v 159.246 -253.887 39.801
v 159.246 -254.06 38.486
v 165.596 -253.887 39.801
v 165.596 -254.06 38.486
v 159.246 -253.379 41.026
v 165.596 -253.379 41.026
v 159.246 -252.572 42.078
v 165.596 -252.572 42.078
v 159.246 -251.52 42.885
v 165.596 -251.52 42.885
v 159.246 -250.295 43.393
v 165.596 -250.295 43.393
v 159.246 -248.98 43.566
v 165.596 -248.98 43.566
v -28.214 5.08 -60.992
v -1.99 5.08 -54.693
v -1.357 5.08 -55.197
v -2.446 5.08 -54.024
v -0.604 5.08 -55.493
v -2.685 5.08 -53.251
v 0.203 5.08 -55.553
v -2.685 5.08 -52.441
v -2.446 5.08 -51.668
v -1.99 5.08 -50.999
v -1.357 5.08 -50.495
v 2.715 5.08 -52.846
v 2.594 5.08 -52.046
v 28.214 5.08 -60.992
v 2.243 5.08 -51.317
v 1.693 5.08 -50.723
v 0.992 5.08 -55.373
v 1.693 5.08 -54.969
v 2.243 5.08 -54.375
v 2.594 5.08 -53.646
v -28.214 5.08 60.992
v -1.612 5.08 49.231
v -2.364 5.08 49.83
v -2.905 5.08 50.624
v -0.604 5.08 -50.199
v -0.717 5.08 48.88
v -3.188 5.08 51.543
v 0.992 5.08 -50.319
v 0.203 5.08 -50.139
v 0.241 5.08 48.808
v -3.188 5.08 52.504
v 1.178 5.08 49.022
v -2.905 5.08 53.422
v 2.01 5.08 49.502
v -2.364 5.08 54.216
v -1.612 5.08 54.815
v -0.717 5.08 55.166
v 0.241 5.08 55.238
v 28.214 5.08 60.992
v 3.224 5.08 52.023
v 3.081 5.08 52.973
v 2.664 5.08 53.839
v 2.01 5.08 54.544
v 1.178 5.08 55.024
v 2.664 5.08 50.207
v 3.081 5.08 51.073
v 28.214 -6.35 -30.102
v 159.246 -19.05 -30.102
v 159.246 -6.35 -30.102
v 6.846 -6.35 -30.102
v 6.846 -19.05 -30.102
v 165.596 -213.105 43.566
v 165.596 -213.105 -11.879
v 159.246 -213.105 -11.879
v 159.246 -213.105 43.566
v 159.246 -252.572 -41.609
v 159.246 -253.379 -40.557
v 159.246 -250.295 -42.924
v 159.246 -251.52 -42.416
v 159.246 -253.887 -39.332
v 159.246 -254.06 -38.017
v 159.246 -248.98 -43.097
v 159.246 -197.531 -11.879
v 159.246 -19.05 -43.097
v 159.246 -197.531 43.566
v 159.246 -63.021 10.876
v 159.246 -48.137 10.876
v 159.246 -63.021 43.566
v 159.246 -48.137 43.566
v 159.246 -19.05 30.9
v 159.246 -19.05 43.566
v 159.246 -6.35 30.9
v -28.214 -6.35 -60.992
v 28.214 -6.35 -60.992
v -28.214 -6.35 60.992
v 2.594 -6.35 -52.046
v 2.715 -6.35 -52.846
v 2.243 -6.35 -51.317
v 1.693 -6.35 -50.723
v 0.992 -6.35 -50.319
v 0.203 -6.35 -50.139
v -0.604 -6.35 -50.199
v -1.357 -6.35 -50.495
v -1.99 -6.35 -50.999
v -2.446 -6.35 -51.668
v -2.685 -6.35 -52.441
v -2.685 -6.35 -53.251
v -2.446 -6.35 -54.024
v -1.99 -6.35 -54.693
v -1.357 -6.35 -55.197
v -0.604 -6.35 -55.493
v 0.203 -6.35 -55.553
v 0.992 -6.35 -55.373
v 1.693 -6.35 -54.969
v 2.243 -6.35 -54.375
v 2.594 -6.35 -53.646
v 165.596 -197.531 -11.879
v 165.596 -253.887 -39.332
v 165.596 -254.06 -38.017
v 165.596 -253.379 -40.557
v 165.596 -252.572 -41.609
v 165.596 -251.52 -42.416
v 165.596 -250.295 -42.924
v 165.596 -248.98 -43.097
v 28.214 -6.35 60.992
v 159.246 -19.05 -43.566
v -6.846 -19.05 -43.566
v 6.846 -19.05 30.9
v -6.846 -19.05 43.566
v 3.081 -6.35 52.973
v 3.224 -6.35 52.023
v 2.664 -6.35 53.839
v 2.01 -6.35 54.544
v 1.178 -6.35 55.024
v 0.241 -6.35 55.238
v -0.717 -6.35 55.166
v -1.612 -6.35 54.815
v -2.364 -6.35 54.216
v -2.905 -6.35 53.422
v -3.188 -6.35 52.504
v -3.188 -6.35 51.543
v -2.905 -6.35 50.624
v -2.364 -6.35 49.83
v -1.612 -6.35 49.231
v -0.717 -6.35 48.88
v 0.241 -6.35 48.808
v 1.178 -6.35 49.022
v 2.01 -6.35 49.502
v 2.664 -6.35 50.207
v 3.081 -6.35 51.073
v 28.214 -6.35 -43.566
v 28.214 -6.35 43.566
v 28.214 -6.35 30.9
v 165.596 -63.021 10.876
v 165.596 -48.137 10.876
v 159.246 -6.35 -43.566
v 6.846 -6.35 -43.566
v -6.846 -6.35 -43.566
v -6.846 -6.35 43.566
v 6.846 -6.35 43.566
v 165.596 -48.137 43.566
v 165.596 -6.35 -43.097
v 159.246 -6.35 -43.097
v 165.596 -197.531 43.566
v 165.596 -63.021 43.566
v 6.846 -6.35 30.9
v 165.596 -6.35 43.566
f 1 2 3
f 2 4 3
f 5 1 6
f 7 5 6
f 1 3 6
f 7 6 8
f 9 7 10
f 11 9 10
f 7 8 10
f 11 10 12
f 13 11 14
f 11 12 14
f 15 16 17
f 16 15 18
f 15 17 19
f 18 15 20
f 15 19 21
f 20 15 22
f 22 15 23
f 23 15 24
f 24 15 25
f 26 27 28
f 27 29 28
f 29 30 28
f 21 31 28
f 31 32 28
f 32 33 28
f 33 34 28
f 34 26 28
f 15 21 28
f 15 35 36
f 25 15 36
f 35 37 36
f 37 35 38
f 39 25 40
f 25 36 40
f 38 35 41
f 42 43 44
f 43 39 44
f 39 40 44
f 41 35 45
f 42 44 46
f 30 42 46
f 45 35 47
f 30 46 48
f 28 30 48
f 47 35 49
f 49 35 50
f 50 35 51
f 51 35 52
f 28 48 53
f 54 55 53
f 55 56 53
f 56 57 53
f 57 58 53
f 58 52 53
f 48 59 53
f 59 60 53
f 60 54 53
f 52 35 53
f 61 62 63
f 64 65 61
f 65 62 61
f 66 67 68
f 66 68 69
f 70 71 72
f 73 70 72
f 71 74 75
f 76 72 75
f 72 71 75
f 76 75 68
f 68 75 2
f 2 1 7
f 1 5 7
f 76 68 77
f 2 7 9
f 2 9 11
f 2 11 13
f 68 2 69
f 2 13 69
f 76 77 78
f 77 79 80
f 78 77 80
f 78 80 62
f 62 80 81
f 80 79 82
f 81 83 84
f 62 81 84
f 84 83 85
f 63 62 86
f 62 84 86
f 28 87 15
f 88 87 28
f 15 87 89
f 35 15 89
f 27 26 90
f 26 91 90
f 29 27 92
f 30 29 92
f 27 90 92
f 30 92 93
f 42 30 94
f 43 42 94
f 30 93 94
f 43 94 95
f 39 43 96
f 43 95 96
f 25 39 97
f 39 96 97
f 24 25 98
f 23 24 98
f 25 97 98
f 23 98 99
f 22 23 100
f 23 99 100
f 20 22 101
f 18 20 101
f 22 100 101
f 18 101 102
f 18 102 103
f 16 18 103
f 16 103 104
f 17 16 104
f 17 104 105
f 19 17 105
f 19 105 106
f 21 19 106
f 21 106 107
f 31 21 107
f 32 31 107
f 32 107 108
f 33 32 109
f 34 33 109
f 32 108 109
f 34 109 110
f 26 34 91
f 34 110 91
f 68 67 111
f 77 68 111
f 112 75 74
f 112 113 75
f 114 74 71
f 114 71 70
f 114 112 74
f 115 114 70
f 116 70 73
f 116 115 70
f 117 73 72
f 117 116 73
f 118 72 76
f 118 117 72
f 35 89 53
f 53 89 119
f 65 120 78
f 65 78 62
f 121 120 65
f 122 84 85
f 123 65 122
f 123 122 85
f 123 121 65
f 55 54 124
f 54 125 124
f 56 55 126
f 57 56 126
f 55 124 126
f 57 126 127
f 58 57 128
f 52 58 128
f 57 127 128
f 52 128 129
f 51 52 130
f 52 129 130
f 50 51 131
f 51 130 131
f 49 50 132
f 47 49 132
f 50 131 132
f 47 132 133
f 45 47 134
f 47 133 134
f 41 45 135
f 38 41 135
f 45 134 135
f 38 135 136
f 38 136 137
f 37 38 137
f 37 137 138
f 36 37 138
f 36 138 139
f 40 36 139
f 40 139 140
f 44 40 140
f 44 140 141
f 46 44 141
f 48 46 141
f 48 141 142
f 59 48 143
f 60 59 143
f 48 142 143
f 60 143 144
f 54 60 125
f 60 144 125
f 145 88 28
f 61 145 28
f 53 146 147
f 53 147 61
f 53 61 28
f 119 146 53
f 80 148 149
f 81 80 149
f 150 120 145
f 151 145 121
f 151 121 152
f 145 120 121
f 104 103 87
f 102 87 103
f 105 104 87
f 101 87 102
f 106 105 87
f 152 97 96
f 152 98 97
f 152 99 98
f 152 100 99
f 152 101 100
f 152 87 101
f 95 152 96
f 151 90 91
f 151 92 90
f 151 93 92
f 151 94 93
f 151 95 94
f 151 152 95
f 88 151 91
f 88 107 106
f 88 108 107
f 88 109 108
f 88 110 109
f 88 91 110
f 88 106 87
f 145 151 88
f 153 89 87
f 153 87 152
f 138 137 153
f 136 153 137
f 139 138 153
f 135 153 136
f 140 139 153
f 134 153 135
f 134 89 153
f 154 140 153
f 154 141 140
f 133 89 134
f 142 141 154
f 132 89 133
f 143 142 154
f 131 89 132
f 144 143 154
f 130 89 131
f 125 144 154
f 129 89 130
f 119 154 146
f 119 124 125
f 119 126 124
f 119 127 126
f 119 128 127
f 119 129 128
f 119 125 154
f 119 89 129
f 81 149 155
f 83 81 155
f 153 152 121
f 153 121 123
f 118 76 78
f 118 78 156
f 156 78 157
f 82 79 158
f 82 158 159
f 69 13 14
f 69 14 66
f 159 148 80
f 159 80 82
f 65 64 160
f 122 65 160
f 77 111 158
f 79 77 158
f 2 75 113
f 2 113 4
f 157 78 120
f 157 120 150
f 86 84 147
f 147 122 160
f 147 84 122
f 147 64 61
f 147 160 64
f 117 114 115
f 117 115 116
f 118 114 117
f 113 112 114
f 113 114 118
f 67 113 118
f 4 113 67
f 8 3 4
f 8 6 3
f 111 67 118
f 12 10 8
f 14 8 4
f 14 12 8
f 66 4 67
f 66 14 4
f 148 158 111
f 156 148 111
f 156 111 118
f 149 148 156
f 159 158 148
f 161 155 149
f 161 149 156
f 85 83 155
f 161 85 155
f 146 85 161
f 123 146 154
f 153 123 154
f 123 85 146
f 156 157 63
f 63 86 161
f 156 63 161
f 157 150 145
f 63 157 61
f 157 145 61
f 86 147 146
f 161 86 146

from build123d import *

# Parameters (mm, degrees)
F0_W      = 56.428283453
F0_H      = 121.9848245382
F1_DEPTH  = 6.35
F2_W      = 13.6921107769
F2_H      = 87.1320217848
F3_DEPTH  = 12.7
F4_W      = 12.7
F4_H      = 12.6656033099
F5_DEPTH  = 152.4
F6_W      = 12.7
F6_H      = 13.4637728333
F7_DEPTH  = 152.4
F8_R      = 3.224201557
F8_R_2    = 2.7149600872
F9_DEPTH  = 6.351
F10_W     = 247.7097766638
F10_H     = 86.6629034281
F11_DEPTH = 6.35
F12_W     = 14.8840993643
F12_H     = 44.3546175957
F12_W_2   = 15.5743807554
F12_H_2   = 78.4596502781
F13_DEPTH = 25.4
F14_R     = 5.08
F15_DEPTH = 5.08


# Not quite as in the source:
# - the program builds the solid bodies; features that only make, move or delete a surface that nothing else refers to are left out


with BuildPart() as f1:
    # F0 (on Front) → F1 (new body)
    with BuildSketch(Plane.XZ):
        Rectangle(F0_W, F0_H)
    extrude(amount=F1_DEPTH)

    # F2 (on face) → F3 (join)
    with BuildSketch(Plane.XZ.offset(6.35)):
        Rectangle(F2_W, F2_H)
    extrude(amount=F3_DEPTH)

    # F4 (on face) → F5 (join)
    with BuildSketch(Plane.YZ.offset(6.8460553885)):
        with Locations((-12.7, 37.2332092375)):
            Rectangle(F4_W, F4_H)
    extrude(amount=F5_DEPTH)

    # F6 (on face) → F7 (join)
    with BuildSketch(Plane.YZ.offset(6.8460553885)):
        with Locations((-12.7, -36.8341244757)):
            Rectangle(F6_W, F6_H)
    extrude(amount=F7_DEPTH)

    # F8 (on face) → F9 (cut, through all)
    with BuildSketch(Plane.XZ.offset(6.35)):
        with Locations((0, 52.0230680704)):
            Circle(F8_R)
        with Locations((0, -52.8460629284)):
            Circle(F8_R_2)
    extrude(amount=-F9_DEPTH, mode=Mode.SUBTRACT)

    # F10 (on face) → F11 (join)
    with BuildSketch(Plane.YZ.offset(159.2460553885)):
        with Locations((-130.2048883319, 0.2345591784)):
            Rectangle(F10_W, F10_H)
    extrude(amount=F11_DEPTH)

    # F12 (on face) → F13 (cut)
    with BuildSketch(Plane.YZ.offset(165.5960553885)):
        with Locations((-55.5786713958, 33.0530032516)):
            Rectangle(F12_W, F12_H)
        with Locations((-205.3182795644, 27.350962162)):
            Rectangle(F12_W_2, F12_H_2)
    extrude(amount=-F13_DEPTH, mode=Mode.SUBTRACT)

    # F14
    f14_edges = [f1.edges().sort_by_distance(p)[0] for p in [
        (162.421055, -254.059777, 43.566011),
        (162.421055, -254.059777, -43.096893),
    ]]
    fillet(f14_edges, radius=F14_R)

    # F15 (add): a face of the model
    f15_faces = [f1.faces().sort_by_distance(p)[0] for p in [
        (0, 0, -0.0696069338),
    ]]
    extrude(f15_faces, amount=F15_DEPTH)


solid = f1.part
